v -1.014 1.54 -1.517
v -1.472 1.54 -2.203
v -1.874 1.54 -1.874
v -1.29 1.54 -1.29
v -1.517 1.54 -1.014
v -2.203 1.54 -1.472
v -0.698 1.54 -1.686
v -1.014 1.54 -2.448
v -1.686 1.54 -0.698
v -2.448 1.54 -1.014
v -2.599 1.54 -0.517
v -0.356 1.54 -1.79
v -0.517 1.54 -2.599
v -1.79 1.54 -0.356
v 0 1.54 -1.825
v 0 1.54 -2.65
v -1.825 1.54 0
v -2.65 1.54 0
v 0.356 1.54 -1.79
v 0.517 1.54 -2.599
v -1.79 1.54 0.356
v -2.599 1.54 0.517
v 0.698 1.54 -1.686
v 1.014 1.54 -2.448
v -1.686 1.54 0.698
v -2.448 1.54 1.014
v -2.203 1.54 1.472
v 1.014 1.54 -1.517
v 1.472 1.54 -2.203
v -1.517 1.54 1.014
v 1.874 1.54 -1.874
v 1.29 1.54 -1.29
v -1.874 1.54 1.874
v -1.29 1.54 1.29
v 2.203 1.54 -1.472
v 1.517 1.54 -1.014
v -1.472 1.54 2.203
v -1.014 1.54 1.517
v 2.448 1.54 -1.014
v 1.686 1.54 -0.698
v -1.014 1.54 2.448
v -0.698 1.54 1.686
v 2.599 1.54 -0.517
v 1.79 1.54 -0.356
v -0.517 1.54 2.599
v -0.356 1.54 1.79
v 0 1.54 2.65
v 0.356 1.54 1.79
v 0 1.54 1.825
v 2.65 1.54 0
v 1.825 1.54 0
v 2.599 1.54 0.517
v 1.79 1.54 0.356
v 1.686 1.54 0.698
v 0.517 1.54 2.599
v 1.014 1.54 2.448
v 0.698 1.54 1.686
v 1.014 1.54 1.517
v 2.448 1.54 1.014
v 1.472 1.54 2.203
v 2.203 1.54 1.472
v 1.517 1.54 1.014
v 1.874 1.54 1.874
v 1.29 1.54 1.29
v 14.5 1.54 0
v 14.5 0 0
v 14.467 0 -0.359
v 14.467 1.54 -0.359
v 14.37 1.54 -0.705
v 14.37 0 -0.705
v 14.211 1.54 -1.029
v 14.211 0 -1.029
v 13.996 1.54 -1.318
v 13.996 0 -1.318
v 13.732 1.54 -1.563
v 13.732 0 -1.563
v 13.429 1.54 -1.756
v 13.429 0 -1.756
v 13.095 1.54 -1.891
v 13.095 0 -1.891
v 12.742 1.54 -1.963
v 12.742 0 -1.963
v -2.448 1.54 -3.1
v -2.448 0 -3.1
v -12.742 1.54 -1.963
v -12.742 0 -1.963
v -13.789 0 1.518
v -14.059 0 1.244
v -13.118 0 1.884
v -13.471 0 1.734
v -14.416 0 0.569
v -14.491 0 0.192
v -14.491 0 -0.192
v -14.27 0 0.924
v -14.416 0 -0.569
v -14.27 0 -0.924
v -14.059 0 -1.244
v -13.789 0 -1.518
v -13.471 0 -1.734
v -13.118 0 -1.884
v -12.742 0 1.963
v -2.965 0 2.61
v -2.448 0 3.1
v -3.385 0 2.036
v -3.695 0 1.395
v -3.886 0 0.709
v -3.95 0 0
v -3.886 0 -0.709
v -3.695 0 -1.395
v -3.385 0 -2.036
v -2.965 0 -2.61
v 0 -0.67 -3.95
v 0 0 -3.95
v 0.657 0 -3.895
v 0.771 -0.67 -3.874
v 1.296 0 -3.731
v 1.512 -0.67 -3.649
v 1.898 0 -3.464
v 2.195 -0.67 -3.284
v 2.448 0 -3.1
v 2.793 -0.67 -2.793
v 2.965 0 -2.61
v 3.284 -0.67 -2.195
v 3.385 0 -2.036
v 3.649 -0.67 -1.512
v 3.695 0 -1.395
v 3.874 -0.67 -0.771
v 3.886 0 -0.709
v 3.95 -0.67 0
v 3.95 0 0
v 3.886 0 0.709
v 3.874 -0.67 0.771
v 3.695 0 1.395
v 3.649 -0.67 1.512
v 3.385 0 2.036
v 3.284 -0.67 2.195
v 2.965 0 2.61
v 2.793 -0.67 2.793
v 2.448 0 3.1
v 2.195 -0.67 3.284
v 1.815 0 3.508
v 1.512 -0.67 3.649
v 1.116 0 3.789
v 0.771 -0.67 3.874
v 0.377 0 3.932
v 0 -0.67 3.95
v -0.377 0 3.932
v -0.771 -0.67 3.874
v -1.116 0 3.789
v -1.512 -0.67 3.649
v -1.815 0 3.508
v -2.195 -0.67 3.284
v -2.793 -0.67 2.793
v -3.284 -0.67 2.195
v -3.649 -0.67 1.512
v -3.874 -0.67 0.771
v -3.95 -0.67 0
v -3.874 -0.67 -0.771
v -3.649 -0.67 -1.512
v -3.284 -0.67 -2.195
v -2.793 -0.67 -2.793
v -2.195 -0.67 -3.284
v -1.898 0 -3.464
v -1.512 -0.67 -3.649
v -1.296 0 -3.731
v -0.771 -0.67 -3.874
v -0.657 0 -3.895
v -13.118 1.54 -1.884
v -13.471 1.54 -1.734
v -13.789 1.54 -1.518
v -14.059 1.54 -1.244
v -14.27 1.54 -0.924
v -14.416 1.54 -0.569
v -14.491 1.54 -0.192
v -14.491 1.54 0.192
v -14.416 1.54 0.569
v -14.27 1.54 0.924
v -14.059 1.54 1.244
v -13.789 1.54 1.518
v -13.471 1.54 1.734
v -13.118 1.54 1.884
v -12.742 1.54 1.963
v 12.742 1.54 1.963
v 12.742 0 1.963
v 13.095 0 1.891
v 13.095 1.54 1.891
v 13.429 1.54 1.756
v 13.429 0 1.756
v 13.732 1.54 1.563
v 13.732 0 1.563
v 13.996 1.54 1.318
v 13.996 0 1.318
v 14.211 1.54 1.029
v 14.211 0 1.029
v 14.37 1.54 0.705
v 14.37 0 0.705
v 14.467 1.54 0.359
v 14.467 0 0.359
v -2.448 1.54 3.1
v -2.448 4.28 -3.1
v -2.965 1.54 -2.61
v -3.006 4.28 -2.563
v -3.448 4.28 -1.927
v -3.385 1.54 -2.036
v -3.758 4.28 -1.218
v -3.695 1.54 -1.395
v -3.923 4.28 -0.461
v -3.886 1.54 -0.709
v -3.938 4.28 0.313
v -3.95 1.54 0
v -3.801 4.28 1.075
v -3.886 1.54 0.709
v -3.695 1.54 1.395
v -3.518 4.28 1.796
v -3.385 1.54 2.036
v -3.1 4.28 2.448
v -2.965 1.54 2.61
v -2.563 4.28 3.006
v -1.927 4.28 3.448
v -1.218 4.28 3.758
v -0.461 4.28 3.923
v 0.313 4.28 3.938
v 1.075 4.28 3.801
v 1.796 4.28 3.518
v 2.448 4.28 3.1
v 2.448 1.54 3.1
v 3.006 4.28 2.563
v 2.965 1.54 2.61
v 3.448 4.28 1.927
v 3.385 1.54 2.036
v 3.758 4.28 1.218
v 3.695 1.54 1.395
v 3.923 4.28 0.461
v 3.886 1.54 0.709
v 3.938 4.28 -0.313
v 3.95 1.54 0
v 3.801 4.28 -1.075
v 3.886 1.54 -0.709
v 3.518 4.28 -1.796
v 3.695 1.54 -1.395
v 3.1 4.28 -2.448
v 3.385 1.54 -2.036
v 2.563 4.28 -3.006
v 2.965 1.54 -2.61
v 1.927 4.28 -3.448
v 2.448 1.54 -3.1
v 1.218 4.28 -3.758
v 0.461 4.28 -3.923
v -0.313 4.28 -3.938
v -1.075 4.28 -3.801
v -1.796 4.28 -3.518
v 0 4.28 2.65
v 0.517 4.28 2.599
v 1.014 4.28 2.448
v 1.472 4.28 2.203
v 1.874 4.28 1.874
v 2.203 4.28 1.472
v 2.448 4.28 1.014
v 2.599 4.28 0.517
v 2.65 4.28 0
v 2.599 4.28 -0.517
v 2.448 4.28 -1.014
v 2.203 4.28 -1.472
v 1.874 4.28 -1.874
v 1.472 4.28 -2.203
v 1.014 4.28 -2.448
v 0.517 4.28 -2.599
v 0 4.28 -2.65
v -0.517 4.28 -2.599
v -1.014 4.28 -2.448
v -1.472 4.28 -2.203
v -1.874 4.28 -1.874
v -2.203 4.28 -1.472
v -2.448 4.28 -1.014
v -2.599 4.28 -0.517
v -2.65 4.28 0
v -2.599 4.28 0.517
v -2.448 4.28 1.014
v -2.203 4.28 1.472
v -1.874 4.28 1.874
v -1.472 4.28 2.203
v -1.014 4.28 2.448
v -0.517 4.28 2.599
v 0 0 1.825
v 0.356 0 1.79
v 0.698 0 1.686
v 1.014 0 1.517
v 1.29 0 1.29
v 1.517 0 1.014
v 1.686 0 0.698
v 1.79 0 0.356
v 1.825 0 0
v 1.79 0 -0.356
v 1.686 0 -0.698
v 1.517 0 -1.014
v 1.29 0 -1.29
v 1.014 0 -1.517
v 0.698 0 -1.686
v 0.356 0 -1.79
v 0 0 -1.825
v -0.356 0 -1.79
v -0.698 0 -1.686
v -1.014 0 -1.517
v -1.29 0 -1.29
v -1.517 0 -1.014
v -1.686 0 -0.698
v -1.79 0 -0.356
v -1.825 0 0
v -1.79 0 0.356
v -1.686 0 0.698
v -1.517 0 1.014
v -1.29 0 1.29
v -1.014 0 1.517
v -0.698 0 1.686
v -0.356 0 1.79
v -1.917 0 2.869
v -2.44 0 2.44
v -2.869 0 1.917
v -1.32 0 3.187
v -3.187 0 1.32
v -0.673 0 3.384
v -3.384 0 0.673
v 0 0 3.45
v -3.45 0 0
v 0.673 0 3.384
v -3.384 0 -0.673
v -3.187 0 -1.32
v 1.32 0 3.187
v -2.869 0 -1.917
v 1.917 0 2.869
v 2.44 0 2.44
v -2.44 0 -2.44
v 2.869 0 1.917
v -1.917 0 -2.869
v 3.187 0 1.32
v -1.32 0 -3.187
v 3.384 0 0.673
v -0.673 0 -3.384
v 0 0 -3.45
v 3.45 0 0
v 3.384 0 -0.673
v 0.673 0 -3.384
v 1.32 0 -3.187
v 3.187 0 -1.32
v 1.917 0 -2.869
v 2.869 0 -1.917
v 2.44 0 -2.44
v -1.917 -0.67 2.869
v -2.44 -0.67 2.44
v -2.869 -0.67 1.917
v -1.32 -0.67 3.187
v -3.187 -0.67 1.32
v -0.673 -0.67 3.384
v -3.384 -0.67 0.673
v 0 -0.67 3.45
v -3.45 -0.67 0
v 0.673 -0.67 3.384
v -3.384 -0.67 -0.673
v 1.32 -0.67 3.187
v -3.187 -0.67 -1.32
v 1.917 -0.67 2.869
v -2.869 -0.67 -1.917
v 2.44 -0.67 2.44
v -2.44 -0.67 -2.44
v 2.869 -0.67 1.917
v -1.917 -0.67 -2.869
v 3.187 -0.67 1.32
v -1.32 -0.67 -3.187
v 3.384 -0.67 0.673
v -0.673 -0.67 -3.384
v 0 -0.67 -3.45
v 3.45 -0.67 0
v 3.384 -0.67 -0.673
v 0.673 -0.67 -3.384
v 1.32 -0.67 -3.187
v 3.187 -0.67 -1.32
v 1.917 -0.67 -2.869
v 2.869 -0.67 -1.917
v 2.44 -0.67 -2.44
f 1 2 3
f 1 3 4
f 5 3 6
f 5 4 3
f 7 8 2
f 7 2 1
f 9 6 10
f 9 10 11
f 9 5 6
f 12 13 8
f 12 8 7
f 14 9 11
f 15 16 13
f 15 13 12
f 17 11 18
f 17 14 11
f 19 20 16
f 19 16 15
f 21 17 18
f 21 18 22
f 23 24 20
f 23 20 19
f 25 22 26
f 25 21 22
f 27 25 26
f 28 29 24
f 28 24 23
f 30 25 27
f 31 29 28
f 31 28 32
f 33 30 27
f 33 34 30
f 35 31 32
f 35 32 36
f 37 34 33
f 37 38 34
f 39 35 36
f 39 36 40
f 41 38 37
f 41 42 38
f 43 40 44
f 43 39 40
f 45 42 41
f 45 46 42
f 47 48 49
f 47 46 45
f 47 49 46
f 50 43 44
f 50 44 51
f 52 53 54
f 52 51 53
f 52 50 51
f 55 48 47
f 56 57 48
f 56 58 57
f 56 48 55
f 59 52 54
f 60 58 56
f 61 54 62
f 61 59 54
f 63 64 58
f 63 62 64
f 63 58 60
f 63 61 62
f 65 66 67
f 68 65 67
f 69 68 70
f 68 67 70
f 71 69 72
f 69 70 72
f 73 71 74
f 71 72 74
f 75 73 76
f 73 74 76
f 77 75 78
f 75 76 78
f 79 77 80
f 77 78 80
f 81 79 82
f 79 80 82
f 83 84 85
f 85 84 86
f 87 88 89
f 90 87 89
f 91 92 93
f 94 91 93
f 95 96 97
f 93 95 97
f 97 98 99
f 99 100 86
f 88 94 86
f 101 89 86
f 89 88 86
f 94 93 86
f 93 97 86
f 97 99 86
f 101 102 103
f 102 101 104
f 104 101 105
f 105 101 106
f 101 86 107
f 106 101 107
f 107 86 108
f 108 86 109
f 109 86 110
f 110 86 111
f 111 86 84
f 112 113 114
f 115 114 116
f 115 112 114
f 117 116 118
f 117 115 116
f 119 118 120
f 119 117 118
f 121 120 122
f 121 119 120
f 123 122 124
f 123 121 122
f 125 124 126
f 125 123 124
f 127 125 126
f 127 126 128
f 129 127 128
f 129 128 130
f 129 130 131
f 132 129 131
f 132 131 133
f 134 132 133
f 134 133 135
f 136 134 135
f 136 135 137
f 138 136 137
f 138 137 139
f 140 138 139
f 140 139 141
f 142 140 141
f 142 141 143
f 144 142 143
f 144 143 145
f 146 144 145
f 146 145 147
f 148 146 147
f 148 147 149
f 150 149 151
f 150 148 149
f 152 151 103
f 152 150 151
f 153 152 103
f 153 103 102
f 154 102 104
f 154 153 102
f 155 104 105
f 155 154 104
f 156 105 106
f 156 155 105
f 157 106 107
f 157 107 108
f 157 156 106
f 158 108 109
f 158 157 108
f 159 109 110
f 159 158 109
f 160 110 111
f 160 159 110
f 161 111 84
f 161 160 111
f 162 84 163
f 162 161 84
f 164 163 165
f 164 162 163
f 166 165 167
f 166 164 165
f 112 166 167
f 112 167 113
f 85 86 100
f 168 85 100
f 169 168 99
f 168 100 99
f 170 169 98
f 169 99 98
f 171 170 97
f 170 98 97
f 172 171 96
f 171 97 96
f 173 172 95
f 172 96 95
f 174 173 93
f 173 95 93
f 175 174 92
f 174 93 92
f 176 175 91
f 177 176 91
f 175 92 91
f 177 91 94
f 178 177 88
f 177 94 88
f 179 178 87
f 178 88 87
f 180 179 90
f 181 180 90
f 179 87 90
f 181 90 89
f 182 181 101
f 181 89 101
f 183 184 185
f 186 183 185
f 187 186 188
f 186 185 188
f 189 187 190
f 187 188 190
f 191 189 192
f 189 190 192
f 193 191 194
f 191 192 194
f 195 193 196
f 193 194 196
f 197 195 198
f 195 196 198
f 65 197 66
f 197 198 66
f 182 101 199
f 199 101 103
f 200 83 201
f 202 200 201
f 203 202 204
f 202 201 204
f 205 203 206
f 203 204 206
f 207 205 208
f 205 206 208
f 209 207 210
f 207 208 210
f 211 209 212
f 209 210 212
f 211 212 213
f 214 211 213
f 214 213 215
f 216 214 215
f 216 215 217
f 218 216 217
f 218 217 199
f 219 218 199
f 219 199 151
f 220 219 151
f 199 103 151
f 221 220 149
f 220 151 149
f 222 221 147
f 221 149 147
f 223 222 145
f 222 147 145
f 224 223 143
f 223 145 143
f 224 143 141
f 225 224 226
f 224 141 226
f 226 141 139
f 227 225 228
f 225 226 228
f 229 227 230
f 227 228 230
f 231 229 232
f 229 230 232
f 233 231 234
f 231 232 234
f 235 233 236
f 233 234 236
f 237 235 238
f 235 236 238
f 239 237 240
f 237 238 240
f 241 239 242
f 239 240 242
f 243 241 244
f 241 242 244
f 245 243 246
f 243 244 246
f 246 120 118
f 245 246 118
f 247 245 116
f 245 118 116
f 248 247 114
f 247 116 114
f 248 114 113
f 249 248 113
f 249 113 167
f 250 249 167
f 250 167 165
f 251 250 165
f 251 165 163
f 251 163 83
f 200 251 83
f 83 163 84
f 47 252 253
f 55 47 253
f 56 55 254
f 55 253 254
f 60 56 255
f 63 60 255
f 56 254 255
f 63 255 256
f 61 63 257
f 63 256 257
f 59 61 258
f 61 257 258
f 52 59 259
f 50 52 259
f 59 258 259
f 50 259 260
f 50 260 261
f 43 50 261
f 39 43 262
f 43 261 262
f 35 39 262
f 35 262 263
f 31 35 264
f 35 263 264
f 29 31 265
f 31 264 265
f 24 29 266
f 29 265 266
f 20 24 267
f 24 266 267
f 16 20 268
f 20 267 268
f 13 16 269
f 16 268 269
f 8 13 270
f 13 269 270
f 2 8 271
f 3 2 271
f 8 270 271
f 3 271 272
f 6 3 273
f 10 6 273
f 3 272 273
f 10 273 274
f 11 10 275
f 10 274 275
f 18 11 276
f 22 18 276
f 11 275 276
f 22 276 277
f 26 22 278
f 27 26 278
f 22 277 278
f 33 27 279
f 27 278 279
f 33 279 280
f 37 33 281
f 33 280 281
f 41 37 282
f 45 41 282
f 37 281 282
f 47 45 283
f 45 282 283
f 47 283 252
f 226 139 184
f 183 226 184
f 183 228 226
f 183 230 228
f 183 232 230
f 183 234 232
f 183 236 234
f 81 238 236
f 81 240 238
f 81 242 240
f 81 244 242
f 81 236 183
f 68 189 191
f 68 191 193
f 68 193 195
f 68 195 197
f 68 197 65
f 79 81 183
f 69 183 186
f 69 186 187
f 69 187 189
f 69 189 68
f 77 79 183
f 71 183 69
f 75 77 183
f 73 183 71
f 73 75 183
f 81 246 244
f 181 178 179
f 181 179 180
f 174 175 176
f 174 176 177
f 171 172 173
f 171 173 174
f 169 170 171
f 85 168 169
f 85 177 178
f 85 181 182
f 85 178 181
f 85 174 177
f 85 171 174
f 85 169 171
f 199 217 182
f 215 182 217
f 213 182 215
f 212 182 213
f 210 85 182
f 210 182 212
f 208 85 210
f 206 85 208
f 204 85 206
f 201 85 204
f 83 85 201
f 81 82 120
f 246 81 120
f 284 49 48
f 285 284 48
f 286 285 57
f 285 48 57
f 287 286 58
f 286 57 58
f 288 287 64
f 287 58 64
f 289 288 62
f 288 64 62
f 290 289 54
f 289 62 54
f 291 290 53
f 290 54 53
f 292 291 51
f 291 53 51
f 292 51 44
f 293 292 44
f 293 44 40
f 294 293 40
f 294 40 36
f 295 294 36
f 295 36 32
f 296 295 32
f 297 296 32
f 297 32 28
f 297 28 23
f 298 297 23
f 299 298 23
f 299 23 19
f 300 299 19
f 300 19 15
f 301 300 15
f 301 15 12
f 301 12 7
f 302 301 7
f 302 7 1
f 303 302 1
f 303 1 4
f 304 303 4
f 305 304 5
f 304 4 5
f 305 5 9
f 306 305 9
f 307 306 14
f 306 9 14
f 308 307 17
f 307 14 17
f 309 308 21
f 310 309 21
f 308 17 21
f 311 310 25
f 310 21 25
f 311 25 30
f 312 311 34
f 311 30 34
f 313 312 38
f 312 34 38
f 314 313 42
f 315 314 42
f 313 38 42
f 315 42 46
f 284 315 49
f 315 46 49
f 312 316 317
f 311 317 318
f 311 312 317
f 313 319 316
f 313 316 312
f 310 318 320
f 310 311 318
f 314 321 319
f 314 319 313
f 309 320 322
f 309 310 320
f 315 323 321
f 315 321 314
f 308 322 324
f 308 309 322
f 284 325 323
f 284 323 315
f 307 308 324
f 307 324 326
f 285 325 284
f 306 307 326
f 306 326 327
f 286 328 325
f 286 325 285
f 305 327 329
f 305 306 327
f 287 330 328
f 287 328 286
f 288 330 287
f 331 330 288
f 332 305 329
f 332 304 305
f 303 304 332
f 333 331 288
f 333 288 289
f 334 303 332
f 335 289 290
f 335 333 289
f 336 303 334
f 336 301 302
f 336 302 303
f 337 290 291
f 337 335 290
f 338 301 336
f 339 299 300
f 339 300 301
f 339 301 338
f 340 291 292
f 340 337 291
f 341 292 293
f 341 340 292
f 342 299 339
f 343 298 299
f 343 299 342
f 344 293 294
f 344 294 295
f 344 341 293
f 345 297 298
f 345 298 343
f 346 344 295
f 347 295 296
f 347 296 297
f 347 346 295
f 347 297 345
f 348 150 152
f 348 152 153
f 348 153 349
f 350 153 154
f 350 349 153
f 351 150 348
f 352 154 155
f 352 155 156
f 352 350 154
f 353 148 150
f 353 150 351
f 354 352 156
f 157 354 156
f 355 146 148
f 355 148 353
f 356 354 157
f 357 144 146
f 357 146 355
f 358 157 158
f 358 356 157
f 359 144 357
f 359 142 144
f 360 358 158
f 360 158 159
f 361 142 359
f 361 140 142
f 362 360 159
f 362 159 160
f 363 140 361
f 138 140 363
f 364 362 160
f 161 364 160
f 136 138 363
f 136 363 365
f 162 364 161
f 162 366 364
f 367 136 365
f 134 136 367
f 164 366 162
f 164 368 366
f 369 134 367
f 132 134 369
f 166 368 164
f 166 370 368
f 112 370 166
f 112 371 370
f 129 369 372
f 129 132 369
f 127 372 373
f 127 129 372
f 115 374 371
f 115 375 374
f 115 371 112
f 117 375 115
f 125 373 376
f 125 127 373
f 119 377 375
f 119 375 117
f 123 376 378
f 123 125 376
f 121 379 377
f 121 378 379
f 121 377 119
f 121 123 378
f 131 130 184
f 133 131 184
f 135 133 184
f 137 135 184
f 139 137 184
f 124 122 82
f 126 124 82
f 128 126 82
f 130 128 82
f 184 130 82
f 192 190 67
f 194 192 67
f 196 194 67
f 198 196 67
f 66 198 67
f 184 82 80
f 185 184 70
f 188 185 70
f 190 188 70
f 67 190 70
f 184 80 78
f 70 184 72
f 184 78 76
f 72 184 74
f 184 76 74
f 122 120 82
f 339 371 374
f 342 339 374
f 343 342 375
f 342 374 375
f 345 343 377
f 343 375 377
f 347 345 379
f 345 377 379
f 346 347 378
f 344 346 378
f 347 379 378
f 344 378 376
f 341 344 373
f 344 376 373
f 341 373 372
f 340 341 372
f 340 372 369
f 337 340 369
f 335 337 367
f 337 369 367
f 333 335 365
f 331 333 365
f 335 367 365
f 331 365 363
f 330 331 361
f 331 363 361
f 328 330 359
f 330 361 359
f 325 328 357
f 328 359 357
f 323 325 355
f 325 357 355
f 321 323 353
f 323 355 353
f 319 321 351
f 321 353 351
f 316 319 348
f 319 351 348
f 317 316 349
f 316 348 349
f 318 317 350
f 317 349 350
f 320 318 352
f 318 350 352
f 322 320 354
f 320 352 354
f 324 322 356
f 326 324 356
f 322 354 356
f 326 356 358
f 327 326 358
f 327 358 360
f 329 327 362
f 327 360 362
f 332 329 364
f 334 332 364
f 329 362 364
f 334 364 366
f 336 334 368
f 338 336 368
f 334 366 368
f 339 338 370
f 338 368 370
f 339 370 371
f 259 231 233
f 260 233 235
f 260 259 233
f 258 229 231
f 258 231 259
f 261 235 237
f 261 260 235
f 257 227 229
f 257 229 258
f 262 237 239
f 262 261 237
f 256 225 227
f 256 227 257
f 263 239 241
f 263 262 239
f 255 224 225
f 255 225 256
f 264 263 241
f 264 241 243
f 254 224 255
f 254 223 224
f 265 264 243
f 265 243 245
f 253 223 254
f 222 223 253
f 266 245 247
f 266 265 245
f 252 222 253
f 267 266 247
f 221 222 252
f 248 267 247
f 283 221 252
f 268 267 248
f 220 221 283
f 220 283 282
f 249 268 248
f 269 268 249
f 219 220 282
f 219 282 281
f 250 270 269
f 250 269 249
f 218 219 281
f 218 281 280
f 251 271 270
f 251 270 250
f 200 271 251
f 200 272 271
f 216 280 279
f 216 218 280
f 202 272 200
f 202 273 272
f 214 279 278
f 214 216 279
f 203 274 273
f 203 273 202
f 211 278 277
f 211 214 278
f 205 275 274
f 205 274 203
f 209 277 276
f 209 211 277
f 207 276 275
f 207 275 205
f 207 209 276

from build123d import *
from build123d.topology import SkipClean

# Parameters (mm, degrees)
SKETCH2_R           = 1.975
SKETCH2_R_2         = 3.95
BOSS_EXTRUDE2_DEPTH = 1.54
SKETCH3_R           = 3.95
BOSS_EXTRUDE3_DEPTH = 2.74
BOSS_EXTRUDE4_START = 0.67
SKETCH4_R           = 3.95
BOSS_EXTRUDE4_DEPTH = 0.67
SKETCH5_R           = 2.65
CUT_EXTRUDE1_DEPTH  = 2.74
SKETCH6_R           = 3.45
CUT_EXTRUDE2_DEPTH  = 0.67
SKETCH7_R           = 1.825
CUT_EXTRUDE3_DEPTH  = 16.276128436


with BuildPart() as part:
    # Sketch2 → Boss-Extrude2 (new body)
    with BuildSketch(Plane(origin=(0, 0, 0), x_dir=(1, 0, 0), z_dir=(0, 1, 0))):
        with BuildLine():
            ThreePointArc((-2.447958333, -3.1), (-3.95, 0), (-2.447958333, 3.1))
            Line((-2.447958333, 3.1), (-12.741816497, 1.963062813))
            ThreePointArc((-12.741816497, 1.963062813), (-11.207348222, 1.471196381), (-10.55, 0))
            ThreePointArc((-10.55, 0), (-11.207348221, -1.471196381), (-12.741816497, -1.963062813))
            Line((-12.741816497, -1.963062813), (-2.447958333, -3.1))
        make_face()
        with Locations((-12.525, 0)):
            Circle(SKETCH2_R)
        Circle(SKETCH2_R_2)
        with BuildLine():
            Line((12.741816497, 1.963062813), (2.447958333, 3.1))
            ThreePointArc((2.447958333, 3.1), (3.554710636, 1.722362416), (3.95, 0))
            ThreePointArc((3.95, 0), (3.554710636, -1.722362416), (2.447958333, -3.1))
            Line((2.447958333, -3.1), (12.741816531, -1.963062809))
            ThreePointArc((12.741816531, -1.963062809), (10.55, -1.7e-08), (12.741816497, 1.963062813))
        make_face()
        with BuildLine():
            ThreePointArc((14.5, 0), (13.996196381, 1.317651778), (12.741816497, 1.963062813))
            ThreePointArc((12.741816497, 1.963062813), (10.55, -1.7e-08), (12.741816531, -1.963062809))
            ThreePointArc((12.741816531, -1.963062809), (13.996196392, -1.317651766), (14.5, 0))
        make_face()
    extrude(amount=BOSS_EXTRUDE2_DEPTH)

    # Sketch3 → Boss-Extrude3 (add)
    with BuildSketch(Plane(origin=(0, 1.54, 0), x_dir=(1, 0, 0), z_dir=(0, 1, 0))):
        with Locations(Location((0, 0, 0), (0, 0, 128.296879298))):
            Circle(SKETCH3_R)
    extrude(amount=BOSS_EXTRUDE3_DEPTH)

    # Sketch4 → Boss-Extrude4 (add)
    with SkipClean():  # the faces are left unmerged after this step: merging them gives an invalid solid
        with BuildSketch(Plane(origin=(0, 0, 0), x_dir=(-1, 0, 0), z_dir=(0, -1, 0)).offset(BOSS_EXTRUDE4_START)):
            with Locations(Location((0, 0, 0), (0, 0, 90))):
                Circle(SKETCH4_R)
        extrude(amount=-BOSS_EXTRUDE4_DEPTH)

    # Sketch5 → Cut-Extrude1 (cut)
    with SkipClean():  # the faces are left unmerged after this step: merging them gives an invalid solid
        with BuildSketch(Plane(origin=(0, 4.28, 0), x_dir=(1, 0, 0), z_dir=(0, 1, 0))):
            with Locations(Location((0, 0, 0), (0, 0, 270))):
                Circle(SKETCH5_R)
        extrude(amount=-CUT_EXTRUDE1_DEPTH, mode=Mode.SUBTRACT)

    # Sketch6 → Cut-Extrude2 (cut)
    with SkipClean():  # the faces are left unmerged after this step: merging them gives an invalid solid
        with BuildSketch(Plane(origin=(0, -0.67, 0), x_dir=(-1, 0, 0), z_dir=(0, -1, 0))):
            with Locations(Location((0, 0, 0), (0, 0, 90))):
                Circle(SKETCH6_R)
        extrude(amount=-CUT_EXTRUDE2_DEPTH, mode=Mode.SUBTRACT)

    # Sketch7 → Cut-Extrude3 (cut, through all)
    with SkipClean():  # the faces are left unmerged after this step: merging them gives an invalid solid
        with BuildSketch(Plane(origin=(0, 1.54, 0), x_dir=(1, 0, 0), z_dir=(0, 1, 0))):
            with Locations(Location((0, 0, 0), (0, 0, 270))):
                Circle(SKETCH7_R)
        extrude(amount=-CUT_EXTRUDE3_DEPTH, mode=Mode.SUBTRACT)


solid = part.part
